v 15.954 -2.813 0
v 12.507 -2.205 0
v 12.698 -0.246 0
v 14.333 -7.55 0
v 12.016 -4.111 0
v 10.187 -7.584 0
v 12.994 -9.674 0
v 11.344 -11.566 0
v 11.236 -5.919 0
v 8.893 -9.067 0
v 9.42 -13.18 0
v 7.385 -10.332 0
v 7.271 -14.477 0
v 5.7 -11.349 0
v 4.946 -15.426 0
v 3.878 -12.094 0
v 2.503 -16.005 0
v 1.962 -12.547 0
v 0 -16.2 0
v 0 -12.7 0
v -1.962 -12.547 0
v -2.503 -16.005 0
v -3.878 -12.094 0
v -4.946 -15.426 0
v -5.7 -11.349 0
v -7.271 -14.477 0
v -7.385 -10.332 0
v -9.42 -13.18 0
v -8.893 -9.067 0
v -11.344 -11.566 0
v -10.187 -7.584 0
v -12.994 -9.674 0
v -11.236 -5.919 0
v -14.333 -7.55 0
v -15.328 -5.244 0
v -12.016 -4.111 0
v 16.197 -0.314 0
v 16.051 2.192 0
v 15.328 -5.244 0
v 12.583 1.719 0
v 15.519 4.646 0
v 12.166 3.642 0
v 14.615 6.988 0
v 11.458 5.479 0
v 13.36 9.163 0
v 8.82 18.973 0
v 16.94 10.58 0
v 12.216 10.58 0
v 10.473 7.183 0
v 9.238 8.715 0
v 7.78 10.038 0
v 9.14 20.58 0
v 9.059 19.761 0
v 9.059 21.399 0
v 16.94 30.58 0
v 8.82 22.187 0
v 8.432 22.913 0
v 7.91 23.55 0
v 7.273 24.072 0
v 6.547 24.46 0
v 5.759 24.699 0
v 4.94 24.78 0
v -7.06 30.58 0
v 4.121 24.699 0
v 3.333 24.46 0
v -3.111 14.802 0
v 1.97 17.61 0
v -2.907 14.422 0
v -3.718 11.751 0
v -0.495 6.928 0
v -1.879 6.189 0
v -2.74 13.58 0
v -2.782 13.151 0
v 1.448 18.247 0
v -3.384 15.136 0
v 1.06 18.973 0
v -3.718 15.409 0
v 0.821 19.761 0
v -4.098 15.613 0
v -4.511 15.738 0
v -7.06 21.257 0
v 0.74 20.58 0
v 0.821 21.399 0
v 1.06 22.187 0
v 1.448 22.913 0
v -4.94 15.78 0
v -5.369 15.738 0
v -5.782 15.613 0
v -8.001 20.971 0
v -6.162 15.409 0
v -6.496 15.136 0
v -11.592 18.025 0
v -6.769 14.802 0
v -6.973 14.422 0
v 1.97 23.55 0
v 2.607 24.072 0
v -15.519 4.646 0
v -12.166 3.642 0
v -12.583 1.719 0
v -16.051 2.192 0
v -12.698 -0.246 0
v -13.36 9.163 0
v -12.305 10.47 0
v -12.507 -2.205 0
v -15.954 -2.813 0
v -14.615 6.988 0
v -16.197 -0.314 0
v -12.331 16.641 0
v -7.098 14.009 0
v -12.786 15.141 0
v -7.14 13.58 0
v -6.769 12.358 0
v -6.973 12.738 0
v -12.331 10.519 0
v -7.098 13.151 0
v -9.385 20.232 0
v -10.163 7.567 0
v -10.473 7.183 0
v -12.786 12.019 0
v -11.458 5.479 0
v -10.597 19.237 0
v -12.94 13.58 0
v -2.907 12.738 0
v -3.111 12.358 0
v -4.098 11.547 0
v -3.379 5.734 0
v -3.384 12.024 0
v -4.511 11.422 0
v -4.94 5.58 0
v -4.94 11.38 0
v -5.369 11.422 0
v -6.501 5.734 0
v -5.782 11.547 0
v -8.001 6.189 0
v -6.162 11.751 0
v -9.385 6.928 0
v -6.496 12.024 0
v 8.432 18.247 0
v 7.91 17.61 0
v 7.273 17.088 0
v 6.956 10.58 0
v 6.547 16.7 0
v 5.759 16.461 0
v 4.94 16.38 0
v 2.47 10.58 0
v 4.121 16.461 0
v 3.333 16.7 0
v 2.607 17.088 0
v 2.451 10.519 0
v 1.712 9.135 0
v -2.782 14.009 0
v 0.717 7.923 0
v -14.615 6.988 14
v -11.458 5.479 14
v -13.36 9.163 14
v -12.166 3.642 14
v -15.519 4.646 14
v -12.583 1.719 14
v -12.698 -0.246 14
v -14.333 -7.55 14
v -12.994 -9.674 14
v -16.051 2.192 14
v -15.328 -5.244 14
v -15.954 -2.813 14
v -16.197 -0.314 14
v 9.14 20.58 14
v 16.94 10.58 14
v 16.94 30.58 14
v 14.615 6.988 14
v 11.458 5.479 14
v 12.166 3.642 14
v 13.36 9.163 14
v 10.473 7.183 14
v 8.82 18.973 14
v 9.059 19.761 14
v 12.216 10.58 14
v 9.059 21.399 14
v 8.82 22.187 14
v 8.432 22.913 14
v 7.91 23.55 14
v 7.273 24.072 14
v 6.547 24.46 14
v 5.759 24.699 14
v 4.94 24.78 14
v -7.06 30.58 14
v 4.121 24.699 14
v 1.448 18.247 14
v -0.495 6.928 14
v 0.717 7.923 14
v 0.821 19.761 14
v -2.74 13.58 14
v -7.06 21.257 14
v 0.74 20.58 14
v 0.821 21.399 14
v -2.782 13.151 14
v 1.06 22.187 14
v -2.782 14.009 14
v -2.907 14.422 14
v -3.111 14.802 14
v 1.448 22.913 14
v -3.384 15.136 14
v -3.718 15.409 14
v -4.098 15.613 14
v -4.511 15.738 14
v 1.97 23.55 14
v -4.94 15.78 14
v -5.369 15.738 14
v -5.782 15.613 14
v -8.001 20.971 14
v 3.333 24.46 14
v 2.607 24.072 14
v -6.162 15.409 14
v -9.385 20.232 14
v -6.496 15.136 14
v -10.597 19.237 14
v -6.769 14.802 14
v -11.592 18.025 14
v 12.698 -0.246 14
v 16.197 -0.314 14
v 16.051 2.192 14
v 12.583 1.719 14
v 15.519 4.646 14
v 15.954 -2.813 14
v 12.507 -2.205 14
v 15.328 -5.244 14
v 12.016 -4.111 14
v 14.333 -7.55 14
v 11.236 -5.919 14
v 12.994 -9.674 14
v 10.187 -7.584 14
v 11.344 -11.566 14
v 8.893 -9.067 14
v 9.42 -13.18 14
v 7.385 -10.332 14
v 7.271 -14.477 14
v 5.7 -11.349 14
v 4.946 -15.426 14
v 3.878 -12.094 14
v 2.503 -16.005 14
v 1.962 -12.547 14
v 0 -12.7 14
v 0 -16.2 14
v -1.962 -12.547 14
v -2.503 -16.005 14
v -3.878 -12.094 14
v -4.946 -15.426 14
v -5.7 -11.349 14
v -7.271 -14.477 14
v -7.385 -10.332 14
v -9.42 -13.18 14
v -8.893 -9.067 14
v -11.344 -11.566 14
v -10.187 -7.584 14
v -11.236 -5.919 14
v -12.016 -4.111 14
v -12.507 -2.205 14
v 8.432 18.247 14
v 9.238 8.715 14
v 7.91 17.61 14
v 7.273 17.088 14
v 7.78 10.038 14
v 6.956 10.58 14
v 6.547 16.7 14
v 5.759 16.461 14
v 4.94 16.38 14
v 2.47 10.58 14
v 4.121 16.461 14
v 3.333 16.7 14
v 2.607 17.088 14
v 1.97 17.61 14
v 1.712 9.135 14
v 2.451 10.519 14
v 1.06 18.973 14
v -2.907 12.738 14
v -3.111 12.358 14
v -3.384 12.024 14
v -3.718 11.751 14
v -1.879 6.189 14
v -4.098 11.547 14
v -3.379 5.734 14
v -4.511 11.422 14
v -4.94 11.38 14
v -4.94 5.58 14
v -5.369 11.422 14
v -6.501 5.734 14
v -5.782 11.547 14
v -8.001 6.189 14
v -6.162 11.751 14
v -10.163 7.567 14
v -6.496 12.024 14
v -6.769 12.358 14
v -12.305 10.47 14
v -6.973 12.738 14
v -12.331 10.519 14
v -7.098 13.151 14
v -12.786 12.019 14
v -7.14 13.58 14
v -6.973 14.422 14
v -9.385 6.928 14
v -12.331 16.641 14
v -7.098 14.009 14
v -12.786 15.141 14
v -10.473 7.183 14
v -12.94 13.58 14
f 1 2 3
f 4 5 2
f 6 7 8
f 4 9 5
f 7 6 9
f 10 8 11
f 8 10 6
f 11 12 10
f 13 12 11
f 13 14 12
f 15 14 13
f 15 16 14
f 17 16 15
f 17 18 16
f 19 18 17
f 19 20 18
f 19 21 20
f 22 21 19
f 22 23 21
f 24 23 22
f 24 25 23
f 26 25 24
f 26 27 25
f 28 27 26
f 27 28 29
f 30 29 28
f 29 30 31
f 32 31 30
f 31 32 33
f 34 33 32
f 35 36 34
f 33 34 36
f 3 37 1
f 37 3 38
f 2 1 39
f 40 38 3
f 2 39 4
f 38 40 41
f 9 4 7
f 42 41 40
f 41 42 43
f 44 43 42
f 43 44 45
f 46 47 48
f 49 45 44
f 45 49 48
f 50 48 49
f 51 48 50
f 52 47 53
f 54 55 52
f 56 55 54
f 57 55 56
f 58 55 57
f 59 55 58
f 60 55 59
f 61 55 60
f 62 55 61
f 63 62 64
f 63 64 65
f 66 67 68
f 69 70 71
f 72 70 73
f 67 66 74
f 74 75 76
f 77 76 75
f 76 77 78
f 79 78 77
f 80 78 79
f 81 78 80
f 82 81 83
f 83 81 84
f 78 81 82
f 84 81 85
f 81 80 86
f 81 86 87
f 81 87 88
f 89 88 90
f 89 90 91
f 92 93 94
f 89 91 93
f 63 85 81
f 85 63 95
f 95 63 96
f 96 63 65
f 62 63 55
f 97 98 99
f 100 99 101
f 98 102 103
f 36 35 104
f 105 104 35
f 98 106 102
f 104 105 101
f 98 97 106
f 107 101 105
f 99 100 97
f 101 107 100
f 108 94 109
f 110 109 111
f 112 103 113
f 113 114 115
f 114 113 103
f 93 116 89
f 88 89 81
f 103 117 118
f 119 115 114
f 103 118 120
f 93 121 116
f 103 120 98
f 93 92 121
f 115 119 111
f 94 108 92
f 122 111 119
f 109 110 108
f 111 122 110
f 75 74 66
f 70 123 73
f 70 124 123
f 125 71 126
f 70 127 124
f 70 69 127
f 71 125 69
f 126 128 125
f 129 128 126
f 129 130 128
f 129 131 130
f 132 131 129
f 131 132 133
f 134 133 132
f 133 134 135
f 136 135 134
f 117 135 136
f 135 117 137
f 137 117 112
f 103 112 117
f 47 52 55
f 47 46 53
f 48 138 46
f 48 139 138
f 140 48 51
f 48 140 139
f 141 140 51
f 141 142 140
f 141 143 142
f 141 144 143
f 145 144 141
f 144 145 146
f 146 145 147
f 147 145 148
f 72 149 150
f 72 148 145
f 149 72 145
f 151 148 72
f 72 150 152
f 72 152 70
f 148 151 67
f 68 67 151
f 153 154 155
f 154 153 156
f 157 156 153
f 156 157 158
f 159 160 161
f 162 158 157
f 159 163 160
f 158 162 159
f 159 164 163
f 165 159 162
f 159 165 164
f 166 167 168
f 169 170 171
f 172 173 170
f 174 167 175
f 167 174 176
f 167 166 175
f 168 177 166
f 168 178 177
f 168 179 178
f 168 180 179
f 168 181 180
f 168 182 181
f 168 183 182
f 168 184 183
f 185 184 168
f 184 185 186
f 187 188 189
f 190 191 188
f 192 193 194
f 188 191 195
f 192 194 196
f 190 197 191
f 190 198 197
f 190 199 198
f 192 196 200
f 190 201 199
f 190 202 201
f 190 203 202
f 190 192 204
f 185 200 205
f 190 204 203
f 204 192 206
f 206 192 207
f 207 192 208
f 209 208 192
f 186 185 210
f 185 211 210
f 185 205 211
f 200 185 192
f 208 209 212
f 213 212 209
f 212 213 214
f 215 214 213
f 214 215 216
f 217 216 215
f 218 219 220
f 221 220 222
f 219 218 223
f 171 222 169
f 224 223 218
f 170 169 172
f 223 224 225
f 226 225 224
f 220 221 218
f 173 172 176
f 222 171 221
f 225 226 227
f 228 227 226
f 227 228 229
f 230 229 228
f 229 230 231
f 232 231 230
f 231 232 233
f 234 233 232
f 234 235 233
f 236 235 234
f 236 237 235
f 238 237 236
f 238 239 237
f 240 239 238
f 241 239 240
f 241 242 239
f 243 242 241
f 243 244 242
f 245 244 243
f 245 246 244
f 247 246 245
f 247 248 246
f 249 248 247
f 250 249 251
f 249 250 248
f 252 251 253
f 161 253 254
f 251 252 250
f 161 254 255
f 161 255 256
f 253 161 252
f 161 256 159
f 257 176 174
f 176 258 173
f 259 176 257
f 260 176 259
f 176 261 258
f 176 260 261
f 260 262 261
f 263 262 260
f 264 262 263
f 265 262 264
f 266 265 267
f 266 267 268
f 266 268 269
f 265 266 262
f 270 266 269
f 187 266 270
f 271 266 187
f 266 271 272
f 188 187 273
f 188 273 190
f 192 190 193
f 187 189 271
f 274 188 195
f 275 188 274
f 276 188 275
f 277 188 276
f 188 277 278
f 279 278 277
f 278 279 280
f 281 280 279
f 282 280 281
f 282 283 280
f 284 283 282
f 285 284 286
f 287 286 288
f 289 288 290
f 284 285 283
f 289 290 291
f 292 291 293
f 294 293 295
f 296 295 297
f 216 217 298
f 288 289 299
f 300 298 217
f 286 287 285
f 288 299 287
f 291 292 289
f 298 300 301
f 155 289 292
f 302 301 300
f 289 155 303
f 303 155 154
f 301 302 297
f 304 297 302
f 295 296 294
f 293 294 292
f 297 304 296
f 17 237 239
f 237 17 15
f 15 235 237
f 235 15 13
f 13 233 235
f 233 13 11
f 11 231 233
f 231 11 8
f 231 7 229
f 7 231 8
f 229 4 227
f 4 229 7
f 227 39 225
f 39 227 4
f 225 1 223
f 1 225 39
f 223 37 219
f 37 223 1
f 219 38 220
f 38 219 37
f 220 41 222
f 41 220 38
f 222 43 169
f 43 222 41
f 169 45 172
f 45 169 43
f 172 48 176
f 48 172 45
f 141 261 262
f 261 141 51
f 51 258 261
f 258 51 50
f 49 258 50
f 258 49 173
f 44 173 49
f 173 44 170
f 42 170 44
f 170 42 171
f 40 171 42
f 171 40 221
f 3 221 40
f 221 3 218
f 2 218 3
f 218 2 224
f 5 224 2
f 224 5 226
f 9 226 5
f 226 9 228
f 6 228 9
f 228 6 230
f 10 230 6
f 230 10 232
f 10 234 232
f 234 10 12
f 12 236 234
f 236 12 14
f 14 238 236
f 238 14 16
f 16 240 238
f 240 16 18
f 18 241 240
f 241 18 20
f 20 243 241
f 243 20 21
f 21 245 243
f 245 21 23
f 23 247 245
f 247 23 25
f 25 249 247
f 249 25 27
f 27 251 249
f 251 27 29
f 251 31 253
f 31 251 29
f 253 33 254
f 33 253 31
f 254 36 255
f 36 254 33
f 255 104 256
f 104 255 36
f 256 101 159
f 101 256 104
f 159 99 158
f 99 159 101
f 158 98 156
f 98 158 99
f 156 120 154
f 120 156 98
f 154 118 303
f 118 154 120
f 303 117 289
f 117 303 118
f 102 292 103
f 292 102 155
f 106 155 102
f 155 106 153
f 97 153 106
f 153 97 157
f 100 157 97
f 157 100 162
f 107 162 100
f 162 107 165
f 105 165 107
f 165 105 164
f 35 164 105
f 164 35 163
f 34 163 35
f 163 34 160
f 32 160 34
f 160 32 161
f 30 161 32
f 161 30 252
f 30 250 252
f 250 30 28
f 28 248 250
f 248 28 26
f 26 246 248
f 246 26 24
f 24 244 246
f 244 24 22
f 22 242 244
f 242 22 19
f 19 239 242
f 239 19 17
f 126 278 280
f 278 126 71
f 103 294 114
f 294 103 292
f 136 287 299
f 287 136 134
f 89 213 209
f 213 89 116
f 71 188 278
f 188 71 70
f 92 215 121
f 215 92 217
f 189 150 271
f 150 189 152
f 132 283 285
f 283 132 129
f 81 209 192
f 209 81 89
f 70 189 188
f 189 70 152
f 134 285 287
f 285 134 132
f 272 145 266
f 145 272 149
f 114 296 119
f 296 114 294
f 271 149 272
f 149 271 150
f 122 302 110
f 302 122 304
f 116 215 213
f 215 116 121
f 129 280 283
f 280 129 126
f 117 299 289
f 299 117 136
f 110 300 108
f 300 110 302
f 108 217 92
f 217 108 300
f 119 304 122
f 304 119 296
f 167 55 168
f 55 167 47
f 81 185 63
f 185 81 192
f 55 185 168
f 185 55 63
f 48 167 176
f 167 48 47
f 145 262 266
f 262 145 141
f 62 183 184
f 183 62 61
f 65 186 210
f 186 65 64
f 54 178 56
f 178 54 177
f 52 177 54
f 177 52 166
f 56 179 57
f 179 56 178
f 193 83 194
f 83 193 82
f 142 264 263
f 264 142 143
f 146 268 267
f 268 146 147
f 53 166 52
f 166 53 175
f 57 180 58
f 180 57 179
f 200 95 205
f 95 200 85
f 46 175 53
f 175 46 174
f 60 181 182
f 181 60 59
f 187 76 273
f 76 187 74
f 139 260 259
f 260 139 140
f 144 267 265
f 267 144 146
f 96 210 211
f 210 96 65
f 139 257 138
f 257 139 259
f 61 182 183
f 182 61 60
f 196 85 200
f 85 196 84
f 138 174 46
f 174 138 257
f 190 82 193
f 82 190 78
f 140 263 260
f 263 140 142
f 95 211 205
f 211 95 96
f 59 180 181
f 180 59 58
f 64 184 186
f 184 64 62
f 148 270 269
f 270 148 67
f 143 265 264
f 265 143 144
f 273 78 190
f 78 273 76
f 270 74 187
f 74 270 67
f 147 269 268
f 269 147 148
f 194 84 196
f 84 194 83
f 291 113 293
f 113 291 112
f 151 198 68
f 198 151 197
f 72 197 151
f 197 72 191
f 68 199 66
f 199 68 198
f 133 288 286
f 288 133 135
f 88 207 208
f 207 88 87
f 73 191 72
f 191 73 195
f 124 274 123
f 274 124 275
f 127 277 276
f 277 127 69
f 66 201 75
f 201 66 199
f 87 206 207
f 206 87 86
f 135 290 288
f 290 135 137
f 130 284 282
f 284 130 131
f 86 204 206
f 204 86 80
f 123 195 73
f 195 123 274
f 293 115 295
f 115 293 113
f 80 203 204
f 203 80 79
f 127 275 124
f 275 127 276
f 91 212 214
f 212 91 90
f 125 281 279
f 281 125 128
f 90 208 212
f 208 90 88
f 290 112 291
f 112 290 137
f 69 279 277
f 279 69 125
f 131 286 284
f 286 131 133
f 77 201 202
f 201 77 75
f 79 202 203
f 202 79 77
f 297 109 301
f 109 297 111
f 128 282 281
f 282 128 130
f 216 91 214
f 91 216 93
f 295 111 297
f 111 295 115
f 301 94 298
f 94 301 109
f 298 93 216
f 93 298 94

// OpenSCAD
$fn = 32;

// ----------------------------------------------------------------------
// Pipe clamp: 32.4 mm ring, 3.5 mm wall, 14 mm wide
// ----------------------------------------------------------------------

// --- parameters (mm) ---
outer_r = 16.2;           // clamp outside radius
inner_r = 12.7;           // pipe bore radius
band = 3.5;               // band thickness
clamp_w = 14;             // clamp width
opening = 40;             // opening angle between the ends
lug_w = 24;               // lug width
lug_len = 20;             // lug length
bolt_d = 8.4;             // bolt hole
knuckle_d = 16;           // hinge knuckle diameter
pin_d = 4.4;              // hinge pin hole

clamp_profile = [[-5.541, 15.223], [-7.826, 14.184], [-9.924, 12.804], [-11.783, 11.117], [-13.36, 9.163], [-14.615, 6.988], [-15.519, 4.646], [-16.051, 2.192], [-16.197, -0.314], [-15.954, -2.813], [-15.328, -5.244], [-14.333, -7.55], [-12.994, -9.674], [-11.344, -11.566], [-9.42, -13.18], [-7.271, -14.477], [-4.946, -15.426], [-2.503, -16.005], [0, -16.2], [2.503, -16.005], [4.946, -15.426], [7.271, -14.477], [9.42, -13.18], [11.344, -11.566], [12.994, -9.674], [14.333, -7.55], [15.328, -5.244], [15.954, -2.813], [16.197, -0.314], [16.051, 2.192], [15.519, 4.646], [14.615, 6.988], [13.36, 9.163], [11.783, 11.117], [9.924, 12.804], [7.826, 14.184], [5.541, 15.223], [4.344, 11.934], [6.136, 11.12], [7.78, 10.038], [9.238, 8.715], [10.473, 7.183], [11.458, 5.479], [12.166, 3.642], [12.583, 1.719], [12.698, -0.246], [12.507, -2.205], [12.016, -4.111], [11.236, -5.919], [10.187, -7.584], [8.893, -9.067], [7.385, -10.332], [5.7, -11.349], [3.878, -12.094], [1.962, -12.547], [0, -12.7], [-1.962, -12.547], [-3.878, -12.094], [-5.7, -11.349], [-7.385, -10.332], [-8.893, -9.067], [-10.187, -7.584], [-11.236, -5.919], [-12.016, -4.111], [-12.507, -2.205], [-12.698, -0.246], [-12.583, 1.719], [-12.166, 3.642], [-11.458, 5.479], [-10.473, 7.183], [-9.238, 8.715], [-7.78, 10.038], [-6.136, 11.12], [-4.344, 11.934]];

difference() {
  union() {
    linear_extrude(height = clamp_w) polygon(clamp_profile);
    /* hinge knuckle, sunk 2 mm into the band end */
    translate([-4.94, 13.58, 0]) cylinder(h = clamp_w, d = knuckle_d);
    /* bolt lug on the other end */
    translate([-7.06, 10.58, 0]) cube([lug_w, 20, clamp_w]);
  }
  translate([4.94, 20.58, -2.5]) cylinder(h = clamp_w + 5, d = bolt_d);
  translate([-4.94, 13.58, -2.5]) cylinder(h = clamp_w + 5, d = pin_d);
}
